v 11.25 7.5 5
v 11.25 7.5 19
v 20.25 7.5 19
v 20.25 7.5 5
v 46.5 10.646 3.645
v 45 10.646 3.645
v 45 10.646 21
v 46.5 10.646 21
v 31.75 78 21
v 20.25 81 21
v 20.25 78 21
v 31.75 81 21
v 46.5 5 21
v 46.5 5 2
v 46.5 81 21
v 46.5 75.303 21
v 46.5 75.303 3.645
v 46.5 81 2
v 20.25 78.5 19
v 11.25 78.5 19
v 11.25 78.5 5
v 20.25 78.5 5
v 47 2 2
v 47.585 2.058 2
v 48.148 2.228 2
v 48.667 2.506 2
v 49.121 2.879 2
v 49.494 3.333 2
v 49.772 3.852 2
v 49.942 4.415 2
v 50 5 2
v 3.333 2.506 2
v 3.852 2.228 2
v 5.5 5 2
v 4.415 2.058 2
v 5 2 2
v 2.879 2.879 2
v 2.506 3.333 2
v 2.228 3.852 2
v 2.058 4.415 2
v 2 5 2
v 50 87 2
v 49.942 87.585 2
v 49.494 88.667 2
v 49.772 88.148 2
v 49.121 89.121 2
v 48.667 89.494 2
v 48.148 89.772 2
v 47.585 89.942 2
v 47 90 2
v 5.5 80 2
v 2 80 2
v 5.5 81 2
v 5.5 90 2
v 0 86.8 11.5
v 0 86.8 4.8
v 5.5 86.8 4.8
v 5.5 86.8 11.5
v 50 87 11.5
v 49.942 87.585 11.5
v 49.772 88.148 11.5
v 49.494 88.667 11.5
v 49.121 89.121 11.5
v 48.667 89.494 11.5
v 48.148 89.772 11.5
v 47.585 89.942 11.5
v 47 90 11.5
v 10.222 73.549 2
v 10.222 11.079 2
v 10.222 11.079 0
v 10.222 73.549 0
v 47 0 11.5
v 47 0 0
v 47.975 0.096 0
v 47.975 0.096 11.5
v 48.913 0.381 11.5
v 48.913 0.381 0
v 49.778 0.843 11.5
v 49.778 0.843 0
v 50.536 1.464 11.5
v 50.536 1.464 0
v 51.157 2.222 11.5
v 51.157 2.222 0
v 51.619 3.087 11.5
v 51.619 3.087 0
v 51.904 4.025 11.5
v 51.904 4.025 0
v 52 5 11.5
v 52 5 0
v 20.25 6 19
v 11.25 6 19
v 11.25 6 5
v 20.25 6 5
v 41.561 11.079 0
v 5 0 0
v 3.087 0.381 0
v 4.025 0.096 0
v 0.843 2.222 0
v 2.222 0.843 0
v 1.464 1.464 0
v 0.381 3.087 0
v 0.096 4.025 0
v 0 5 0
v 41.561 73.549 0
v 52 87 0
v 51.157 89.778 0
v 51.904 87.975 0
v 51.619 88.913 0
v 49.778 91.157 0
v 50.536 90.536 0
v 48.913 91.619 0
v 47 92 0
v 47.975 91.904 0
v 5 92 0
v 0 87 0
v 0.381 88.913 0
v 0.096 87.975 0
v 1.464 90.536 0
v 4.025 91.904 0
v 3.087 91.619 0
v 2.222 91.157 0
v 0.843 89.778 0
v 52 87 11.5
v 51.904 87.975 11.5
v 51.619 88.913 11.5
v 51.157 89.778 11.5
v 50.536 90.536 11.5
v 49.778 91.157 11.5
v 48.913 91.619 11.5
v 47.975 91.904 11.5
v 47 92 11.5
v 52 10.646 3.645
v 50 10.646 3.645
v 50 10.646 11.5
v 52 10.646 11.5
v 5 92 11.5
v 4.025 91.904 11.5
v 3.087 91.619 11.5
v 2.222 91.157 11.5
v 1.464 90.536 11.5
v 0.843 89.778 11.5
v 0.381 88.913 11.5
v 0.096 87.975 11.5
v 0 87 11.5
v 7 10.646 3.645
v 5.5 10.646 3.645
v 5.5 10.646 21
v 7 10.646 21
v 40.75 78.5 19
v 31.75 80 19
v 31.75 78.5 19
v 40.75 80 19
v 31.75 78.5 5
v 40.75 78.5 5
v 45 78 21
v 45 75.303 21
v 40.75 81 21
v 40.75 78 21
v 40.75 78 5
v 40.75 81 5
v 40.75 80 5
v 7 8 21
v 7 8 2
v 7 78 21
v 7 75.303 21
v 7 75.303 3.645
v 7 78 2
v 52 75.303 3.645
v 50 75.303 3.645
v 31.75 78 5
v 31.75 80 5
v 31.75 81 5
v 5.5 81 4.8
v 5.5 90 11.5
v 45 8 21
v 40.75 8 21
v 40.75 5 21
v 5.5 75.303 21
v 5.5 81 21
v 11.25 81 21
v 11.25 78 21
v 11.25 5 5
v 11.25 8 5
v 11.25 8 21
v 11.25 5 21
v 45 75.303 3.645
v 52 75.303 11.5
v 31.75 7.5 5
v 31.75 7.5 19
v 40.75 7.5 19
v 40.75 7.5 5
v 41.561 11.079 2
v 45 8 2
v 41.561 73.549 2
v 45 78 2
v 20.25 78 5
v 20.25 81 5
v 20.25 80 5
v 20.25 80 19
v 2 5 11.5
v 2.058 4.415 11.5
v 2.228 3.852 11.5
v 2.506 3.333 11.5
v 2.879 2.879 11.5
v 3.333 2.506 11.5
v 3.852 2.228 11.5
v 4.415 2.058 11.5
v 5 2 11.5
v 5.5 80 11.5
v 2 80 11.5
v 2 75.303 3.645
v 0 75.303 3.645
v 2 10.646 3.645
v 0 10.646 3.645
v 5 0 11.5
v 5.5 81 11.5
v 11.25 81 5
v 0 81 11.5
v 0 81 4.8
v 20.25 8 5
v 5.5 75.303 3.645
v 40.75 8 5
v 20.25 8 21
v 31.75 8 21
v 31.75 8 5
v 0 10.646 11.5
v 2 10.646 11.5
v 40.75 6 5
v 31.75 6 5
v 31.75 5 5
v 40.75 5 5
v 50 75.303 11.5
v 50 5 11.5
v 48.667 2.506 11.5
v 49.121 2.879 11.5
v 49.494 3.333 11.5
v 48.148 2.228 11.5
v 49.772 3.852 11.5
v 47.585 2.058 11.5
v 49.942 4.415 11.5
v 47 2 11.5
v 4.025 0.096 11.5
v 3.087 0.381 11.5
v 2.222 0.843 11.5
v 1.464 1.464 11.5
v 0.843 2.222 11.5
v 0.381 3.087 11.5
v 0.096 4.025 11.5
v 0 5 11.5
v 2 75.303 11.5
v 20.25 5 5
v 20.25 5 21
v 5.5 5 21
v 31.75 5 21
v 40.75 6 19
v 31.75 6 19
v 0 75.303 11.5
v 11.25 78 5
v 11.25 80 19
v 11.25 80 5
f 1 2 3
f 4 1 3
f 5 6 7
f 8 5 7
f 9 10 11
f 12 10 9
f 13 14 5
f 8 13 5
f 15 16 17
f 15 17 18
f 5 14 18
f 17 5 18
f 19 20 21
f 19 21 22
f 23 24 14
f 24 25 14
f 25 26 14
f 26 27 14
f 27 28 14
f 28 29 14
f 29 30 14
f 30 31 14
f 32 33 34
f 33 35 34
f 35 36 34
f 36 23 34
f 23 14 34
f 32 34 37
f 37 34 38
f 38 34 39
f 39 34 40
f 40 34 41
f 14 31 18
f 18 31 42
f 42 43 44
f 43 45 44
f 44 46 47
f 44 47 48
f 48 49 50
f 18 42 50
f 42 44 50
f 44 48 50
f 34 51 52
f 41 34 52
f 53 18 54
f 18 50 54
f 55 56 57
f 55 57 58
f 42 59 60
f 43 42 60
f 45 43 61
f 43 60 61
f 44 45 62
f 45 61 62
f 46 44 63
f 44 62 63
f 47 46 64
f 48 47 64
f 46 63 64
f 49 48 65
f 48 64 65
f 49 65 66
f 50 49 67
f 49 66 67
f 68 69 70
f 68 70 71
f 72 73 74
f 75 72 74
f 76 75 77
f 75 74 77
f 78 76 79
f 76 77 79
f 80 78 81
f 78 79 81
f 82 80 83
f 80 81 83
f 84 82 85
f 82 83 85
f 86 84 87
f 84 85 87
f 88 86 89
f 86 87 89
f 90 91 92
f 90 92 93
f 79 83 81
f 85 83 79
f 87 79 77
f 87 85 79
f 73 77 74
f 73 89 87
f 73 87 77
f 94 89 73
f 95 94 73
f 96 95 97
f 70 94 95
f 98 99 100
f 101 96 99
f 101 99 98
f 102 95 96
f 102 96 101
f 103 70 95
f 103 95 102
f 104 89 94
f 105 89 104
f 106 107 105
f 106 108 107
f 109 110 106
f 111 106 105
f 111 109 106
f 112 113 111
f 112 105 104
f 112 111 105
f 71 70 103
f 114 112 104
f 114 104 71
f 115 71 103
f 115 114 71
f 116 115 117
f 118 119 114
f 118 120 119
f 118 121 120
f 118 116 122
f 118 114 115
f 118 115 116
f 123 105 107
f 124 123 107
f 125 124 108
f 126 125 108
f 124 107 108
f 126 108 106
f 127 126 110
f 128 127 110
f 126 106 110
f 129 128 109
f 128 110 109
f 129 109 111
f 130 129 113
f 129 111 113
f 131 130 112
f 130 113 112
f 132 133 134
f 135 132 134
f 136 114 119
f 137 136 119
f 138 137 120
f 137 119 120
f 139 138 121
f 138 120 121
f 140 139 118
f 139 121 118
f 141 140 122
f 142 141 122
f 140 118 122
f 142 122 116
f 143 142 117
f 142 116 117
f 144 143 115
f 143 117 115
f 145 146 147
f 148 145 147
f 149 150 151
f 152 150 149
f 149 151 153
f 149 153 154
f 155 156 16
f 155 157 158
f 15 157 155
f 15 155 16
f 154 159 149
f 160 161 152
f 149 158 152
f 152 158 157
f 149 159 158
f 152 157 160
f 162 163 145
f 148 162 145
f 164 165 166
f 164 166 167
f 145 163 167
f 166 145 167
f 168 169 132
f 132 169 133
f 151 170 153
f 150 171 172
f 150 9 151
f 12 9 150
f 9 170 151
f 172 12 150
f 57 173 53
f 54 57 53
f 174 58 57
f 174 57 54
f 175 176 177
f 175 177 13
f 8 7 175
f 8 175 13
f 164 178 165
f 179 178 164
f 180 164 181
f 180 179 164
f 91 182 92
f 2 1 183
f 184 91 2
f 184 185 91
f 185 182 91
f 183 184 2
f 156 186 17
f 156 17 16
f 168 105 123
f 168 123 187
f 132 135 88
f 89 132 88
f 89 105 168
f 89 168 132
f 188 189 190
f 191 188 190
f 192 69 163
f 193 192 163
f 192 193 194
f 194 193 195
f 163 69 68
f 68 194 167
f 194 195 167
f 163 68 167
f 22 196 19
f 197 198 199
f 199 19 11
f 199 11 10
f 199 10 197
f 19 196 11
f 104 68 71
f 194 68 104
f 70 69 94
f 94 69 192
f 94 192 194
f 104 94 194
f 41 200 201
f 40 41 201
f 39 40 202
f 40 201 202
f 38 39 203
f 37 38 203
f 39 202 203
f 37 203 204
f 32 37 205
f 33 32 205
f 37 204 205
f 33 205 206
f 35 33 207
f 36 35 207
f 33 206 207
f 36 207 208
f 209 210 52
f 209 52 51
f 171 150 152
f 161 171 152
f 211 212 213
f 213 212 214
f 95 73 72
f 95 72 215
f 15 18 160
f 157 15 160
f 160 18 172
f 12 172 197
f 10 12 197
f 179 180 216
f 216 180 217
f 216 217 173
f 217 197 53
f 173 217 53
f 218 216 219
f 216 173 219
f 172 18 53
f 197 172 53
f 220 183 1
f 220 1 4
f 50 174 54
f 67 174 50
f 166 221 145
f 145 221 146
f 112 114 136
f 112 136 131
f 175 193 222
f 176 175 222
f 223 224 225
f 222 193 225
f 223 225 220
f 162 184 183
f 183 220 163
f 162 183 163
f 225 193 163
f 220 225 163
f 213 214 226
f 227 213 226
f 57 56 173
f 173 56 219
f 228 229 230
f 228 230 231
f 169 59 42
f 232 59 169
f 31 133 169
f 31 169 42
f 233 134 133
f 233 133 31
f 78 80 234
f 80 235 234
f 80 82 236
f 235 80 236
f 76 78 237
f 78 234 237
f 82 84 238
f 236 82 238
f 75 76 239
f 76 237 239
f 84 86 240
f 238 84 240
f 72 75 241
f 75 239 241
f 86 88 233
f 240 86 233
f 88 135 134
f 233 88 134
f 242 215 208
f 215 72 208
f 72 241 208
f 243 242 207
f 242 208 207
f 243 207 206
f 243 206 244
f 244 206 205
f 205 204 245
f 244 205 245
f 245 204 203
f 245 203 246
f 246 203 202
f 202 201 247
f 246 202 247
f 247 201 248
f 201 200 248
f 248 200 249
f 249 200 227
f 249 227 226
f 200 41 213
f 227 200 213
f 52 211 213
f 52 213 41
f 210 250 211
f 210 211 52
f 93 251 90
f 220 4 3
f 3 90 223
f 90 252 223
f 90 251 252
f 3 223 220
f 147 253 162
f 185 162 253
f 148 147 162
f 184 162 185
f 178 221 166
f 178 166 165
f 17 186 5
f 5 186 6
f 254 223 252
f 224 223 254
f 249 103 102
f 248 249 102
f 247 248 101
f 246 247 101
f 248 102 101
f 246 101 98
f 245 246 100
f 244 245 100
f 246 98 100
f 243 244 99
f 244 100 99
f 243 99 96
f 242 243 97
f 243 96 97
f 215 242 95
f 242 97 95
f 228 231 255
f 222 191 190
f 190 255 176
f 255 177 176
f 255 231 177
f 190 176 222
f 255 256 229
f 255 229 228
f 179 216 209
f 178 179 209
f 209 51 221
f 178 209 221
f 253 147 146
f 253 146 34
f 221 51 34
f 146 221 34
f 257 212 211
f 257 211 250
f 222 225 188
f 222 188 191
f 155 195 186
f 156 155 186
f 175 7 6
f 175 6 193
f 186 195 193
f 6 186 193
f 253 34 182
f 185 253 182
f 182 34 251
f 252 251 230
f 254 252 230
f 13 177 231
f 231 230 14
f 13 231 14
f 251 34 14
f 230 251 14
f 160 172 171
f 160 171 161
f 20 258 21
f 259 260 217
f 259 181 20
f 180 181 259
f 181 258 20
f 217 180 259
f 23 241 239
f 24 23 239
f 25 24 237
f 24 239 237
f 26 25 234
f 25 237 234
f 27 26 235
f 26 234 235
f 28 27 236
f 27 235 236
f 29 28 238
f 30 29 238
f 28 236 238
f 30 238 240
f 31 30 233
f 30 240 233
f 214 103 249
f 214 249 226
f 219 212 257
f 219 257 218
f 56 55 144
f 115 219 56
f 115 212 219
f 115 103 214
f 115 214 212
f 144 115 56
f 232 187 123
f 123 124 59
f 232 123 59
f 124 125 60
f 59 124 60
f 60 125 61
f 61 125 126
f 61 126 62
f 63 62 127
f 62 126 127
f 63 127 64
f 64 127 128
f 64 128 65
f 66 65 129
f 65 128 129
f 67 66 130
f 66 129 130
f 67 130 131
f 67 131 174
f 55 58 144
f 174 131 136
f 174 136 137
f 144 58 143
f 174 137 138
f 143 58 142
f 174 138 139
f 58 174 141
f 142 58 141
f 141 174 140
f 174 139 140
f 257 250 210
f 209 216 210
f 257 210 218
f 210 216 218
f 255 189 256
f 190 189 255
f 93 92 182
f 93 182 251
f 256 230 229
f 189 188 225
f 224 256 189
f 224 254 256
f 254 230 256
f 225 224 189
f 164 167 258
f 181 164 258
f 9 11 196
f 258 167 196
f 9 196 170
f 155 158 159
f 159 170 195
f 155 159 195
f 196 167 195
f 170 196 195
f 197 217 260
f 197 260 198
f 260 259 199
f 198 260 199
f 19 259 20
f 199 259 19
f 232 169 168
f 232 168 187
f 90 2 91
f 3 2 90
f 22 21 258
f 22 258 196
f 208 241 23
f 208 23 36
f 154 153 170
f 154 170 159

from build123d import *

# Parameters (mm, degrees)
PAD_DEPTH       = 11.5
POCKET_DEPTH    = 9.5
PAD001_DEPTH    = 19
SKETCH003_W     = 5.8
SKETCH003_H     = 6.7
POCKET001_DEPTH = 6
SKETCH004_W     = 9
SKETCH004_H     = 76
POCKET002_DEPTH = 2
SKETCH005_W     = 9
SKETCH005_H     = 71
SKETCH005_H_2   = 1
POCKET003_DEPTH = 14
SKETCH006_W     = 31.339315
SKETCH006_H     = 62.470386
POCKET004_DEPTH = 5
SKETCH007_W     = 64.656841
SKETCH007_H     = 18.636995
POCKET005_DEPTH = 75


with BuildPart() as part:
    # Sketch → Pad (new body)
    with BuildSketch(Plane.XY):
        with BuildLine():
            Line((0, 5), (0, 87))
            ThreePointArc((5, 92), (1.464466, 90.535534), (0, 87))
            Line((5, 92), (47, 92))
            ThreePointArc((52, 87), (50.535534, 90.535534), (47, 92))
            Line((52, 87), (52, 5))
            ThreePointArc((47, 0), (50.535534, 1.464466), (52, 5))
            Line((47, 0), (5, 0))
            ThreePointArc((0, 5), (1.464466, 1.464466), (5, 0))
        make_face()
    extrude(amount=PAD_DEPTH)

    # Sketch001 → Pocket (cut)
    with BuildSketch(Plane.XY.offset(11.5)):
        with BuildLine():
            Line((2, 5), (2, 80))
            Line((2, 80), (5.5, 80))
            Line((5.5, 80), (5.5, 90))
            Line((5.5, 90), (47, 90))
            ThreePointArc((50, 87), (49.12132, 89.12132), (47, 90))
            Line((50, 87), (50, 5))
            ThreePointArc((47, 2), (49.12132, 2.87868), (50, 5))
            Line((47, 2), (5, 2))
            ThreePointArc((2, 5), (2.87868, 2.87868), (5, 2))
        make_face()
    extrude(amount=-POCKET_DEPTH, mode=Mode.SUBTRACT)

    # Sketch002 → Pad001 (new body)
    with BuildSketch(Plane.XY.offset(2)):
        Polygon((5.5, 5), (26, 5), (46.5, 5), (46.5, 81), (5.5, 81), align=None)
        Polygon((7, 78), (45, 78), (45, 8), (26, 8), (7, 8), align=None, mode=Mode.SUBTRACT)
    extrude(amount=PAD001_DEPTH)

    # Sketch003 → Pocket001 (cut)
    with BuildSketch(Plane(origin=(0, 0, 0), x_dir=(0, -1, 0), z_dir=(-1, 0, 0))):
        with Locations((-83.9, 8.15)):
            Rectangle(SKETCH003_W, SKETCH003_H)
    extrude(amount=-POCKET001_DEPTH, mode=Mode.SUBTRACT)

    # Sketch004 → Pocket002 (cut)
    with BuildSketch(Plane.XY.offset(21)):
        with Locations((15.75, 43)):
            Rectangle(SKETCH004_W, SKETCH004_H)
        with Locations((36.25, 43)):
            Rectangle(SKETCH004_W, SKETCH004_H)
    extrude(amount=-POCKET002_DEPTH, mode=Mode.SUBTRACT)

    # Sketch005 → Pocket003 (cut)
    with BuildSketch(Plane.XY.offset(19)):
        with Locations((15.75, 43)):
            Rectangle(SKETCH005_W, SKETCH005_H)
        with Locations((36.25, 43)):
            Rectangle(SKETCH005_W, SKETCH005_H)
        with Locations((15.75, 80.5)):
            Rectangle(SKETCH005_W, SKETCH005_H_2)
        with Locations((36.25, 80.5)):
            Rectangle(SKETCH005_W, SKETCH005_H_2)
        with Locations((15.75, 5.5)):
            Rectangle(SKETCH005_W, SKETCH005_H_2)
        with Locations((36.25, 5.5)):
            Rectangle(SKETCH005_W, SKETCH005_H_2)
    extrude(amount=-POCKET003_DEPTH, mode=Mode.SUBTRACT)

    # Sketch006 → Pocket004 (cut)
    with BuildSketch(Plane.XY.offset(2)):
        with Locations((25.891194, 42.313818)):
            Rectangle(SKETCH006_W, SKETCH006_H)
    extrude(amount=-POCKET004_DEPTH, mode=Mode.SUBTRACT)

    # Sketch007 → Pocket005 (cut)
    with BuildSketch(Plane(origin=(0, 0, 0), x_dir=(0, -1, 0), z_dir=(-1, 0, 0))):
        with Locations((-42.974649, 12.963171)):
            Rectangle(SKETCH007_W, SKETCH007_H)
    extrude(amount=-POCKET005_DEPTH, mode=Mode.SUBTRACT)


solid = part.part
